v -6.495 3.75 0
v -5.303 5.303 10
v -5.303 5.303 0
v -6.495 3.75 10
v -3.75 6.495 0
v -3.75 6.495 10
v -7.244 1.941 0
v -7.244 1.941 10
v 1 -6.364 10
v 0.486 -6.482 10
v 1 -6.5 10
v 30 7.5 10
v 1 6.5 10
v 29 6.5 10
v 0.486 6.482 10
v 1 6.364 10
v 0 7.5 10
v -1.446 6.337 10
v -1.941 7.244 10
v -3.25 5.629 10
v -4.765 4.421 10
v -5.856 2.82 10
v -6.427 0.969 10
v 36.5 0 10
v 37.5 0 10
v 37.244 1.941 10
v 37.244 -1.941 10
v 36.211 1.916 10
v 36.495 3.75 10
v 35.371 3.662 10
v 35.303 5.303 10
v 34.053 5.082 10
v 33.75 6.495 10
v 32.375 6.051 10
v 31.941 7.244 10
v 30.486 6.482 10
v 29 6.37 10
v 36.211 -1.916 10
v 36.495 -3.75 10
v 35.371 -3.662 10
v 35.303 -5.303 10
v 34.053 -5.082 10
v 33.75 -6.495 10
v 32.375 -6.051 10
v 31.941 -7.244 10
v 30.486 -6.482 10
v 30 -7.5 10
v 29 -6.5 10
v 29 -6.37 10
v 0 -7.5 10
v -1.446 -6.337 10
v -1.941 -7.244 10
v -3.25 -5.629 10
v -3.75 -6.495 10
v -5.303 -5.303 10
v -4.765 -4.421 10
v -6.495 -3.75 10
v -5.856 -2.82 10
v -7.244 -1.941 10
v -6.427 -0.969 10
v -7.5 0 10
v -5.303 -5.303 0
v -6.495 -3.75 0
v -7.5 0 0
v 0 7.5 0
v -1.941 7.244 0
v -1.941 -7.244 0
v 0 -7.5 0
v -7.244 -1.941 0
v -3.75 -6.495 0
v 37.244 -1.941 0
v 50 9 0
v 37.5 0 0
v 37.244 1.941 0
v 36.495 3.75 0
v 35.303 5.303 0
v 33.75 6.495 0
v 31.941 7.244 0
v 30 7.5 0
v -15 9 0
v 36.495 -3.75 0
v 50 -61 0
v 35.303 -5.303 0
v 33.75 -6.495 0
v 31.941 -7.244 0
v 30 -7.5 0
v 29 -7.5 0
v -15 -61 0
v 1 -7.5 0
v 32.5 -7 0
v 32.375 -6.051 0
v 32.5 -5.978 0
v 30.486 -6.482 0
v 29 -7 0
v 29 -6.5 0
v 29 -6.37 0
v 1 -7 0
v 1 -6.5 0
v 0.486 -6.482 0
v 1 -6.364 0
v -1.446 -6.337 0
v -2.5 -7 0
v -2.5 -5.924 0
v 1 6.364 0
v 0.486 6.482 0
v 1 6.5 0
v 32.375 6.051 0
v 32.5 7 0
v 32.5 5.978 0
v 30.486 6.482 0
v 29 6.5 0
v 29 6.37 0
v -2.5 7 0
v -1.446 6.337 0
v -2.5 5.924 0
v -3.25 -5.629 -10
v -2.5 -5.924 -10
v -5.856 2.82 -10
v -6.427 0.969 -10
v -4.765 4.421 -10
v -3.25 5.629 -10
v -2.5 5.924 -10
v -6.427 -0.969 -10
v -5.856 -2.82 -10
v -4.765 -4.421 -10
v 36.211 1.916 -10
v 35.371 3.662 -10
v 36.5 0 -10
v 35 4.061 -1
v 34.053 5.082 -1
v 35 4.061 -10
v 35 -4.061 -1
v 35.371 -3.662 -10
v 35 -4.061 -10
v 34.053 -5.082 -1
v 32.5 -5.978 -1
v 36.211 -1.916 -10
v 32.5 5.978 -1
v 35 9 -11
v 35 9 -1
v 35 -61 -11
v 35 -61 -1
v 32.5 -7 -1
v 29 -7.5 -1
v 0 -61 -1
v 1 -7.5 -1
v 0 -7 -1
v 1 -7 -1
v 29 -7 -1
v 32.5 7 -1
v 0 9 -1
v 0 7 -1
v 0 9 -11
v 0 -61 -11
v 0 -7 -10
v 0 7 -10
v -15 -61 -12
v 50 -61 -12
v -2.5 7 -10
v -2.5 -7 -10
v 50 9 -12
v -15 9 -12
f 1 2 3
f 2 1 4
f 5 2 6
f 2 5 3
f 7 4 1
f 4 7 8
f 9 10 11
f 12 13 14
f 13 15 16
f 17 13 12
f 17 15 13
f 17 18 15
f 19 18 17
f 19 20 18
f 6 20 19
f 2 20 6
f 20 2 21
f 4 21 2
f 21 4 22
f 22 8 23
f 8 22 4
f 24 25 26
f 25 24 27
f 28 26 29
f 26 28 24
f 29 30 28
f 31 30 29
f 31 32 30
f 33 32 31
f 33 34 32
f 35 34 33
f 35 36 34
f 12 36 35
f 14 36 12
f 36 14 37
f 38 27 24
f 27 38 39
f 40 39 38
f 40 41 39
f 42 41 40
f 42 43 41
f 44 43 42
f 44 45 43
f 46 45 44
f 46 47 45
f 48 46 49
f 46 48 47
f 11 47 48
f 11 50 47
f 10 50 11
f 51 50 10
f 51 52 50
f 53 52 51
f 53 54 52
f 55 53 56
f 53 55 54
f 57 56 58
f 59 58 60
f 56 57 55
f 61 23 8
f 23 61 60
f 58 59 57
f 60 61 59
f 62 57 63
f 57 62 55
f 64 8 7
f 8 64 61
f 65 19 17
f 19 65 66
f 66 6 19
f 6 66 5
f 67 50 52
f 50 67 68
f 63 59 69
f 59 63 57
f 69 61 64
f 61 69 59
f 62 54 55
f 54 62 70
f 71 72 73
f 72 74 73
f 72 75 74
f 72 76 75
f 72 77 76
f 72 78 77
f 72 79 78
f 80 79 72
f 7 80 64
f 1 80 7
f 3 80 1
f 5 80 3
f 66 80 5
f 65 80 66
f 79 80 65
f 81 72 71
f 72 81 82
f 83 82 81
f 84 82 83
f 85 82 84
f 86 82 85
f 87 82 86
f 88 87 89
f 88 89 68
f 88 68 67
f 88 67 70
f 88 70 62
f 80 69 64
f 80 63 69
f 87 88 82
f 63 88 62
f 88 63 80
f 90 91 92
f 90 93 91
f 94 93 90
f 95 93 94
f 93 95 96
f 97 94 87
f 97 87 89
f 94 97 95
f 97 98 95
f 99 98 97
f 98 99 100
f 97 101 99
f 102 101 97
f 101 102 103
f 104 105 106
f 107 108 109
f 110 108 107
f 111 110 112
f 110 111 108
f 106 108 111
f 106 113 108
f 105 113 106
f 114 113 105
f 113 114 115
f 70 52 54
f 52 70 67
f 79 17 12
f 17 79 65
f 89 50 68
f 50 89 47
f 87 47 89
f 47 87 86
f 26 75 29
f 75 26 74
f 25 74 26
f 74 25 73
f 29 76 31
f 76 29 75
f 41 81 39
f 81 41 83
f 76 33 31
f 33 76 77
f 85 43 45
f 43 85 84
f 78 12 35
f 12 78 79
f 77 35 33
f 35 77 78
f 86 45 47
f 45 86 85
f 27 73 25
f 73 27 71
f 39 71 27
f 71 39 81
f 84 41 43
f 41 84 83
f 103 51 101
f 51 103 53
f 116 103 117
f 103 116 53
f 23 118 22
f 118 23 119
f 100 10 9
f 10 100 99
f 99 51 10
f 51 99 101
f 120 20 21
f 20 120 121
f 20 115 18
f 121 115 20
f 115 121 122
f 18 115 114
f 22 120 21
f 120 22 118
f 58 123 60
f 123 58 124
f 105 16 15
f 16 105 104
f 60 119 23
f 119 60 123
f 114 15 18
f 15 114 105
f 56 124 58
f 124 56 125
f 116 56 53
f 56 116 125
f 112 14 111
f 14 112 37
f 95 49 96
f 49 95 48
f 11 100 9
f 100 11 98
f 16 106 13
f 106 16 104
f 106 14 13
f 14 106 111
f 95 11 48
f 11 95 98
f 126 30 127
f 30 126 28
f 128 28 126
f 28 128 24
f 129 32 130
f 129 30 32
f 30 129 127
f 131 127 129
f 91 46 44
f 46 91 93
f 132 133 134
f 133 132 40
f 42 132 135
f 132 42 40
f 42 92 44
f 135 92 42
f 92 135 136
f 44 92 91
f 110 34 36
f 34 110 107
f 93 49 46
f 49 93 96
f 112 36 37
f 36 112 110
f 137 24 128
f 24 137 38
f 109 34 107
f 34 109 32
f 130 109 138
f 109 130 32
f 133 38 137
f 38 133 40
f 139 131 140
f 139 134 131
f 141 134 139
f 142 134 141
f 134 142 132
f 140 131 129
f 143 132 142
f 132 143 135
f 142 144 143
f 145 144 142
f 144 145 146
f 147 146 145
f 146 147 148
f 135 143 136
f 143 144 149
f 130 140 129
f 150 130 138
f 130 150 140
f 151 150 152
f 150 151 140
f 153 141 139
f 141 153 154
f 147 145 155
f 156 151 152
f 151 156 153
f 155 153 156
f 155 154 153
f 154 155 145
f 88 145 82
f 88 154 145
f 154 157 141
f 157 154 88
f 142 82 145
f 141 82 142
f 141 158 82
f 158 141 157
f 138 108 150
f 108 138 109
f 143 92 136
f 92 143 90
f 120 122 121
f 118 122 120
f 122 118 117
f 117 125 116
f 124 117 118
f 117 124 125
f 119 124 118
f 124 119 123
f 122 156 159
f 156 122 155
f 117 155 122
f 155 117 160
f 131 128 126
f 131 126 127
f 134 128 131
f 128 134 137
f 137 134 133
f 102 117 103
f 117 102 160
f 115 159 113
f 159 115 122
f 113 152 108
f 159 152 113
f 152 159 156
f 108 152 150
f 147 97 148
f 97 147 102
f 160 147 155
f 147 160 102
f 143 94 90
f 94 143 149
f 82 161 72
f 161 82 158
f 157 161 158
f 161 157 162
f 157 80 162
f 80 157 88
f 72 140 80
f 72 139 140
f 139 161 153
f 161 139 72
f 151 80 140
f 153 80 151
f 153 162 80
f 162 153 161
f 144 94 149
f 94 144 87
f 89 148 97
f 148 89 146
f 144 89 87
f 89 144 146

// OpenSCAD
s=7.5;
t=10;
// round element (plug)
difference(){
    union(){
        cylinder(t, s, s);
        translate([0,-s ,0]){
          cube([30,s*2  ,t]);
        }
        translate([30,0,0]){
          cylinder(t , s, s);
        }
    }
    union(){
        cylinder(15, s - 1, s- 1);
        translate([1, -6.5, 0]){
            cube([28, s*2 -2, 15]);
        }
        translate([30, 0, 0]){
            cylinder(15, s - 1, s - 1);
        }
    }
}
// cuboid element (cable guide)
c=50;
difference(){
    translate([-15, -61, -12]){
        difference(){
            cube([c+15,c+20,12]);
            union(){
                translate([15, 0, 1]){
                    cube([c - 15, c *2, 10]);
                }
                translate([12.5,s*6+9,2]){
                    cube([35, s * 2 - 1,12]);
                }
            }
        }
    }
    translate([0,0,-10]){
        cylinder(15, s - 1,  s-1);
        translate([1, -7.5, 0]){
            cube([28, s*2 -2, 15]);
        }
        translate([30, 0, 0]){
            cylinder(15, s - 1, s - 1);
        }
    }
}
